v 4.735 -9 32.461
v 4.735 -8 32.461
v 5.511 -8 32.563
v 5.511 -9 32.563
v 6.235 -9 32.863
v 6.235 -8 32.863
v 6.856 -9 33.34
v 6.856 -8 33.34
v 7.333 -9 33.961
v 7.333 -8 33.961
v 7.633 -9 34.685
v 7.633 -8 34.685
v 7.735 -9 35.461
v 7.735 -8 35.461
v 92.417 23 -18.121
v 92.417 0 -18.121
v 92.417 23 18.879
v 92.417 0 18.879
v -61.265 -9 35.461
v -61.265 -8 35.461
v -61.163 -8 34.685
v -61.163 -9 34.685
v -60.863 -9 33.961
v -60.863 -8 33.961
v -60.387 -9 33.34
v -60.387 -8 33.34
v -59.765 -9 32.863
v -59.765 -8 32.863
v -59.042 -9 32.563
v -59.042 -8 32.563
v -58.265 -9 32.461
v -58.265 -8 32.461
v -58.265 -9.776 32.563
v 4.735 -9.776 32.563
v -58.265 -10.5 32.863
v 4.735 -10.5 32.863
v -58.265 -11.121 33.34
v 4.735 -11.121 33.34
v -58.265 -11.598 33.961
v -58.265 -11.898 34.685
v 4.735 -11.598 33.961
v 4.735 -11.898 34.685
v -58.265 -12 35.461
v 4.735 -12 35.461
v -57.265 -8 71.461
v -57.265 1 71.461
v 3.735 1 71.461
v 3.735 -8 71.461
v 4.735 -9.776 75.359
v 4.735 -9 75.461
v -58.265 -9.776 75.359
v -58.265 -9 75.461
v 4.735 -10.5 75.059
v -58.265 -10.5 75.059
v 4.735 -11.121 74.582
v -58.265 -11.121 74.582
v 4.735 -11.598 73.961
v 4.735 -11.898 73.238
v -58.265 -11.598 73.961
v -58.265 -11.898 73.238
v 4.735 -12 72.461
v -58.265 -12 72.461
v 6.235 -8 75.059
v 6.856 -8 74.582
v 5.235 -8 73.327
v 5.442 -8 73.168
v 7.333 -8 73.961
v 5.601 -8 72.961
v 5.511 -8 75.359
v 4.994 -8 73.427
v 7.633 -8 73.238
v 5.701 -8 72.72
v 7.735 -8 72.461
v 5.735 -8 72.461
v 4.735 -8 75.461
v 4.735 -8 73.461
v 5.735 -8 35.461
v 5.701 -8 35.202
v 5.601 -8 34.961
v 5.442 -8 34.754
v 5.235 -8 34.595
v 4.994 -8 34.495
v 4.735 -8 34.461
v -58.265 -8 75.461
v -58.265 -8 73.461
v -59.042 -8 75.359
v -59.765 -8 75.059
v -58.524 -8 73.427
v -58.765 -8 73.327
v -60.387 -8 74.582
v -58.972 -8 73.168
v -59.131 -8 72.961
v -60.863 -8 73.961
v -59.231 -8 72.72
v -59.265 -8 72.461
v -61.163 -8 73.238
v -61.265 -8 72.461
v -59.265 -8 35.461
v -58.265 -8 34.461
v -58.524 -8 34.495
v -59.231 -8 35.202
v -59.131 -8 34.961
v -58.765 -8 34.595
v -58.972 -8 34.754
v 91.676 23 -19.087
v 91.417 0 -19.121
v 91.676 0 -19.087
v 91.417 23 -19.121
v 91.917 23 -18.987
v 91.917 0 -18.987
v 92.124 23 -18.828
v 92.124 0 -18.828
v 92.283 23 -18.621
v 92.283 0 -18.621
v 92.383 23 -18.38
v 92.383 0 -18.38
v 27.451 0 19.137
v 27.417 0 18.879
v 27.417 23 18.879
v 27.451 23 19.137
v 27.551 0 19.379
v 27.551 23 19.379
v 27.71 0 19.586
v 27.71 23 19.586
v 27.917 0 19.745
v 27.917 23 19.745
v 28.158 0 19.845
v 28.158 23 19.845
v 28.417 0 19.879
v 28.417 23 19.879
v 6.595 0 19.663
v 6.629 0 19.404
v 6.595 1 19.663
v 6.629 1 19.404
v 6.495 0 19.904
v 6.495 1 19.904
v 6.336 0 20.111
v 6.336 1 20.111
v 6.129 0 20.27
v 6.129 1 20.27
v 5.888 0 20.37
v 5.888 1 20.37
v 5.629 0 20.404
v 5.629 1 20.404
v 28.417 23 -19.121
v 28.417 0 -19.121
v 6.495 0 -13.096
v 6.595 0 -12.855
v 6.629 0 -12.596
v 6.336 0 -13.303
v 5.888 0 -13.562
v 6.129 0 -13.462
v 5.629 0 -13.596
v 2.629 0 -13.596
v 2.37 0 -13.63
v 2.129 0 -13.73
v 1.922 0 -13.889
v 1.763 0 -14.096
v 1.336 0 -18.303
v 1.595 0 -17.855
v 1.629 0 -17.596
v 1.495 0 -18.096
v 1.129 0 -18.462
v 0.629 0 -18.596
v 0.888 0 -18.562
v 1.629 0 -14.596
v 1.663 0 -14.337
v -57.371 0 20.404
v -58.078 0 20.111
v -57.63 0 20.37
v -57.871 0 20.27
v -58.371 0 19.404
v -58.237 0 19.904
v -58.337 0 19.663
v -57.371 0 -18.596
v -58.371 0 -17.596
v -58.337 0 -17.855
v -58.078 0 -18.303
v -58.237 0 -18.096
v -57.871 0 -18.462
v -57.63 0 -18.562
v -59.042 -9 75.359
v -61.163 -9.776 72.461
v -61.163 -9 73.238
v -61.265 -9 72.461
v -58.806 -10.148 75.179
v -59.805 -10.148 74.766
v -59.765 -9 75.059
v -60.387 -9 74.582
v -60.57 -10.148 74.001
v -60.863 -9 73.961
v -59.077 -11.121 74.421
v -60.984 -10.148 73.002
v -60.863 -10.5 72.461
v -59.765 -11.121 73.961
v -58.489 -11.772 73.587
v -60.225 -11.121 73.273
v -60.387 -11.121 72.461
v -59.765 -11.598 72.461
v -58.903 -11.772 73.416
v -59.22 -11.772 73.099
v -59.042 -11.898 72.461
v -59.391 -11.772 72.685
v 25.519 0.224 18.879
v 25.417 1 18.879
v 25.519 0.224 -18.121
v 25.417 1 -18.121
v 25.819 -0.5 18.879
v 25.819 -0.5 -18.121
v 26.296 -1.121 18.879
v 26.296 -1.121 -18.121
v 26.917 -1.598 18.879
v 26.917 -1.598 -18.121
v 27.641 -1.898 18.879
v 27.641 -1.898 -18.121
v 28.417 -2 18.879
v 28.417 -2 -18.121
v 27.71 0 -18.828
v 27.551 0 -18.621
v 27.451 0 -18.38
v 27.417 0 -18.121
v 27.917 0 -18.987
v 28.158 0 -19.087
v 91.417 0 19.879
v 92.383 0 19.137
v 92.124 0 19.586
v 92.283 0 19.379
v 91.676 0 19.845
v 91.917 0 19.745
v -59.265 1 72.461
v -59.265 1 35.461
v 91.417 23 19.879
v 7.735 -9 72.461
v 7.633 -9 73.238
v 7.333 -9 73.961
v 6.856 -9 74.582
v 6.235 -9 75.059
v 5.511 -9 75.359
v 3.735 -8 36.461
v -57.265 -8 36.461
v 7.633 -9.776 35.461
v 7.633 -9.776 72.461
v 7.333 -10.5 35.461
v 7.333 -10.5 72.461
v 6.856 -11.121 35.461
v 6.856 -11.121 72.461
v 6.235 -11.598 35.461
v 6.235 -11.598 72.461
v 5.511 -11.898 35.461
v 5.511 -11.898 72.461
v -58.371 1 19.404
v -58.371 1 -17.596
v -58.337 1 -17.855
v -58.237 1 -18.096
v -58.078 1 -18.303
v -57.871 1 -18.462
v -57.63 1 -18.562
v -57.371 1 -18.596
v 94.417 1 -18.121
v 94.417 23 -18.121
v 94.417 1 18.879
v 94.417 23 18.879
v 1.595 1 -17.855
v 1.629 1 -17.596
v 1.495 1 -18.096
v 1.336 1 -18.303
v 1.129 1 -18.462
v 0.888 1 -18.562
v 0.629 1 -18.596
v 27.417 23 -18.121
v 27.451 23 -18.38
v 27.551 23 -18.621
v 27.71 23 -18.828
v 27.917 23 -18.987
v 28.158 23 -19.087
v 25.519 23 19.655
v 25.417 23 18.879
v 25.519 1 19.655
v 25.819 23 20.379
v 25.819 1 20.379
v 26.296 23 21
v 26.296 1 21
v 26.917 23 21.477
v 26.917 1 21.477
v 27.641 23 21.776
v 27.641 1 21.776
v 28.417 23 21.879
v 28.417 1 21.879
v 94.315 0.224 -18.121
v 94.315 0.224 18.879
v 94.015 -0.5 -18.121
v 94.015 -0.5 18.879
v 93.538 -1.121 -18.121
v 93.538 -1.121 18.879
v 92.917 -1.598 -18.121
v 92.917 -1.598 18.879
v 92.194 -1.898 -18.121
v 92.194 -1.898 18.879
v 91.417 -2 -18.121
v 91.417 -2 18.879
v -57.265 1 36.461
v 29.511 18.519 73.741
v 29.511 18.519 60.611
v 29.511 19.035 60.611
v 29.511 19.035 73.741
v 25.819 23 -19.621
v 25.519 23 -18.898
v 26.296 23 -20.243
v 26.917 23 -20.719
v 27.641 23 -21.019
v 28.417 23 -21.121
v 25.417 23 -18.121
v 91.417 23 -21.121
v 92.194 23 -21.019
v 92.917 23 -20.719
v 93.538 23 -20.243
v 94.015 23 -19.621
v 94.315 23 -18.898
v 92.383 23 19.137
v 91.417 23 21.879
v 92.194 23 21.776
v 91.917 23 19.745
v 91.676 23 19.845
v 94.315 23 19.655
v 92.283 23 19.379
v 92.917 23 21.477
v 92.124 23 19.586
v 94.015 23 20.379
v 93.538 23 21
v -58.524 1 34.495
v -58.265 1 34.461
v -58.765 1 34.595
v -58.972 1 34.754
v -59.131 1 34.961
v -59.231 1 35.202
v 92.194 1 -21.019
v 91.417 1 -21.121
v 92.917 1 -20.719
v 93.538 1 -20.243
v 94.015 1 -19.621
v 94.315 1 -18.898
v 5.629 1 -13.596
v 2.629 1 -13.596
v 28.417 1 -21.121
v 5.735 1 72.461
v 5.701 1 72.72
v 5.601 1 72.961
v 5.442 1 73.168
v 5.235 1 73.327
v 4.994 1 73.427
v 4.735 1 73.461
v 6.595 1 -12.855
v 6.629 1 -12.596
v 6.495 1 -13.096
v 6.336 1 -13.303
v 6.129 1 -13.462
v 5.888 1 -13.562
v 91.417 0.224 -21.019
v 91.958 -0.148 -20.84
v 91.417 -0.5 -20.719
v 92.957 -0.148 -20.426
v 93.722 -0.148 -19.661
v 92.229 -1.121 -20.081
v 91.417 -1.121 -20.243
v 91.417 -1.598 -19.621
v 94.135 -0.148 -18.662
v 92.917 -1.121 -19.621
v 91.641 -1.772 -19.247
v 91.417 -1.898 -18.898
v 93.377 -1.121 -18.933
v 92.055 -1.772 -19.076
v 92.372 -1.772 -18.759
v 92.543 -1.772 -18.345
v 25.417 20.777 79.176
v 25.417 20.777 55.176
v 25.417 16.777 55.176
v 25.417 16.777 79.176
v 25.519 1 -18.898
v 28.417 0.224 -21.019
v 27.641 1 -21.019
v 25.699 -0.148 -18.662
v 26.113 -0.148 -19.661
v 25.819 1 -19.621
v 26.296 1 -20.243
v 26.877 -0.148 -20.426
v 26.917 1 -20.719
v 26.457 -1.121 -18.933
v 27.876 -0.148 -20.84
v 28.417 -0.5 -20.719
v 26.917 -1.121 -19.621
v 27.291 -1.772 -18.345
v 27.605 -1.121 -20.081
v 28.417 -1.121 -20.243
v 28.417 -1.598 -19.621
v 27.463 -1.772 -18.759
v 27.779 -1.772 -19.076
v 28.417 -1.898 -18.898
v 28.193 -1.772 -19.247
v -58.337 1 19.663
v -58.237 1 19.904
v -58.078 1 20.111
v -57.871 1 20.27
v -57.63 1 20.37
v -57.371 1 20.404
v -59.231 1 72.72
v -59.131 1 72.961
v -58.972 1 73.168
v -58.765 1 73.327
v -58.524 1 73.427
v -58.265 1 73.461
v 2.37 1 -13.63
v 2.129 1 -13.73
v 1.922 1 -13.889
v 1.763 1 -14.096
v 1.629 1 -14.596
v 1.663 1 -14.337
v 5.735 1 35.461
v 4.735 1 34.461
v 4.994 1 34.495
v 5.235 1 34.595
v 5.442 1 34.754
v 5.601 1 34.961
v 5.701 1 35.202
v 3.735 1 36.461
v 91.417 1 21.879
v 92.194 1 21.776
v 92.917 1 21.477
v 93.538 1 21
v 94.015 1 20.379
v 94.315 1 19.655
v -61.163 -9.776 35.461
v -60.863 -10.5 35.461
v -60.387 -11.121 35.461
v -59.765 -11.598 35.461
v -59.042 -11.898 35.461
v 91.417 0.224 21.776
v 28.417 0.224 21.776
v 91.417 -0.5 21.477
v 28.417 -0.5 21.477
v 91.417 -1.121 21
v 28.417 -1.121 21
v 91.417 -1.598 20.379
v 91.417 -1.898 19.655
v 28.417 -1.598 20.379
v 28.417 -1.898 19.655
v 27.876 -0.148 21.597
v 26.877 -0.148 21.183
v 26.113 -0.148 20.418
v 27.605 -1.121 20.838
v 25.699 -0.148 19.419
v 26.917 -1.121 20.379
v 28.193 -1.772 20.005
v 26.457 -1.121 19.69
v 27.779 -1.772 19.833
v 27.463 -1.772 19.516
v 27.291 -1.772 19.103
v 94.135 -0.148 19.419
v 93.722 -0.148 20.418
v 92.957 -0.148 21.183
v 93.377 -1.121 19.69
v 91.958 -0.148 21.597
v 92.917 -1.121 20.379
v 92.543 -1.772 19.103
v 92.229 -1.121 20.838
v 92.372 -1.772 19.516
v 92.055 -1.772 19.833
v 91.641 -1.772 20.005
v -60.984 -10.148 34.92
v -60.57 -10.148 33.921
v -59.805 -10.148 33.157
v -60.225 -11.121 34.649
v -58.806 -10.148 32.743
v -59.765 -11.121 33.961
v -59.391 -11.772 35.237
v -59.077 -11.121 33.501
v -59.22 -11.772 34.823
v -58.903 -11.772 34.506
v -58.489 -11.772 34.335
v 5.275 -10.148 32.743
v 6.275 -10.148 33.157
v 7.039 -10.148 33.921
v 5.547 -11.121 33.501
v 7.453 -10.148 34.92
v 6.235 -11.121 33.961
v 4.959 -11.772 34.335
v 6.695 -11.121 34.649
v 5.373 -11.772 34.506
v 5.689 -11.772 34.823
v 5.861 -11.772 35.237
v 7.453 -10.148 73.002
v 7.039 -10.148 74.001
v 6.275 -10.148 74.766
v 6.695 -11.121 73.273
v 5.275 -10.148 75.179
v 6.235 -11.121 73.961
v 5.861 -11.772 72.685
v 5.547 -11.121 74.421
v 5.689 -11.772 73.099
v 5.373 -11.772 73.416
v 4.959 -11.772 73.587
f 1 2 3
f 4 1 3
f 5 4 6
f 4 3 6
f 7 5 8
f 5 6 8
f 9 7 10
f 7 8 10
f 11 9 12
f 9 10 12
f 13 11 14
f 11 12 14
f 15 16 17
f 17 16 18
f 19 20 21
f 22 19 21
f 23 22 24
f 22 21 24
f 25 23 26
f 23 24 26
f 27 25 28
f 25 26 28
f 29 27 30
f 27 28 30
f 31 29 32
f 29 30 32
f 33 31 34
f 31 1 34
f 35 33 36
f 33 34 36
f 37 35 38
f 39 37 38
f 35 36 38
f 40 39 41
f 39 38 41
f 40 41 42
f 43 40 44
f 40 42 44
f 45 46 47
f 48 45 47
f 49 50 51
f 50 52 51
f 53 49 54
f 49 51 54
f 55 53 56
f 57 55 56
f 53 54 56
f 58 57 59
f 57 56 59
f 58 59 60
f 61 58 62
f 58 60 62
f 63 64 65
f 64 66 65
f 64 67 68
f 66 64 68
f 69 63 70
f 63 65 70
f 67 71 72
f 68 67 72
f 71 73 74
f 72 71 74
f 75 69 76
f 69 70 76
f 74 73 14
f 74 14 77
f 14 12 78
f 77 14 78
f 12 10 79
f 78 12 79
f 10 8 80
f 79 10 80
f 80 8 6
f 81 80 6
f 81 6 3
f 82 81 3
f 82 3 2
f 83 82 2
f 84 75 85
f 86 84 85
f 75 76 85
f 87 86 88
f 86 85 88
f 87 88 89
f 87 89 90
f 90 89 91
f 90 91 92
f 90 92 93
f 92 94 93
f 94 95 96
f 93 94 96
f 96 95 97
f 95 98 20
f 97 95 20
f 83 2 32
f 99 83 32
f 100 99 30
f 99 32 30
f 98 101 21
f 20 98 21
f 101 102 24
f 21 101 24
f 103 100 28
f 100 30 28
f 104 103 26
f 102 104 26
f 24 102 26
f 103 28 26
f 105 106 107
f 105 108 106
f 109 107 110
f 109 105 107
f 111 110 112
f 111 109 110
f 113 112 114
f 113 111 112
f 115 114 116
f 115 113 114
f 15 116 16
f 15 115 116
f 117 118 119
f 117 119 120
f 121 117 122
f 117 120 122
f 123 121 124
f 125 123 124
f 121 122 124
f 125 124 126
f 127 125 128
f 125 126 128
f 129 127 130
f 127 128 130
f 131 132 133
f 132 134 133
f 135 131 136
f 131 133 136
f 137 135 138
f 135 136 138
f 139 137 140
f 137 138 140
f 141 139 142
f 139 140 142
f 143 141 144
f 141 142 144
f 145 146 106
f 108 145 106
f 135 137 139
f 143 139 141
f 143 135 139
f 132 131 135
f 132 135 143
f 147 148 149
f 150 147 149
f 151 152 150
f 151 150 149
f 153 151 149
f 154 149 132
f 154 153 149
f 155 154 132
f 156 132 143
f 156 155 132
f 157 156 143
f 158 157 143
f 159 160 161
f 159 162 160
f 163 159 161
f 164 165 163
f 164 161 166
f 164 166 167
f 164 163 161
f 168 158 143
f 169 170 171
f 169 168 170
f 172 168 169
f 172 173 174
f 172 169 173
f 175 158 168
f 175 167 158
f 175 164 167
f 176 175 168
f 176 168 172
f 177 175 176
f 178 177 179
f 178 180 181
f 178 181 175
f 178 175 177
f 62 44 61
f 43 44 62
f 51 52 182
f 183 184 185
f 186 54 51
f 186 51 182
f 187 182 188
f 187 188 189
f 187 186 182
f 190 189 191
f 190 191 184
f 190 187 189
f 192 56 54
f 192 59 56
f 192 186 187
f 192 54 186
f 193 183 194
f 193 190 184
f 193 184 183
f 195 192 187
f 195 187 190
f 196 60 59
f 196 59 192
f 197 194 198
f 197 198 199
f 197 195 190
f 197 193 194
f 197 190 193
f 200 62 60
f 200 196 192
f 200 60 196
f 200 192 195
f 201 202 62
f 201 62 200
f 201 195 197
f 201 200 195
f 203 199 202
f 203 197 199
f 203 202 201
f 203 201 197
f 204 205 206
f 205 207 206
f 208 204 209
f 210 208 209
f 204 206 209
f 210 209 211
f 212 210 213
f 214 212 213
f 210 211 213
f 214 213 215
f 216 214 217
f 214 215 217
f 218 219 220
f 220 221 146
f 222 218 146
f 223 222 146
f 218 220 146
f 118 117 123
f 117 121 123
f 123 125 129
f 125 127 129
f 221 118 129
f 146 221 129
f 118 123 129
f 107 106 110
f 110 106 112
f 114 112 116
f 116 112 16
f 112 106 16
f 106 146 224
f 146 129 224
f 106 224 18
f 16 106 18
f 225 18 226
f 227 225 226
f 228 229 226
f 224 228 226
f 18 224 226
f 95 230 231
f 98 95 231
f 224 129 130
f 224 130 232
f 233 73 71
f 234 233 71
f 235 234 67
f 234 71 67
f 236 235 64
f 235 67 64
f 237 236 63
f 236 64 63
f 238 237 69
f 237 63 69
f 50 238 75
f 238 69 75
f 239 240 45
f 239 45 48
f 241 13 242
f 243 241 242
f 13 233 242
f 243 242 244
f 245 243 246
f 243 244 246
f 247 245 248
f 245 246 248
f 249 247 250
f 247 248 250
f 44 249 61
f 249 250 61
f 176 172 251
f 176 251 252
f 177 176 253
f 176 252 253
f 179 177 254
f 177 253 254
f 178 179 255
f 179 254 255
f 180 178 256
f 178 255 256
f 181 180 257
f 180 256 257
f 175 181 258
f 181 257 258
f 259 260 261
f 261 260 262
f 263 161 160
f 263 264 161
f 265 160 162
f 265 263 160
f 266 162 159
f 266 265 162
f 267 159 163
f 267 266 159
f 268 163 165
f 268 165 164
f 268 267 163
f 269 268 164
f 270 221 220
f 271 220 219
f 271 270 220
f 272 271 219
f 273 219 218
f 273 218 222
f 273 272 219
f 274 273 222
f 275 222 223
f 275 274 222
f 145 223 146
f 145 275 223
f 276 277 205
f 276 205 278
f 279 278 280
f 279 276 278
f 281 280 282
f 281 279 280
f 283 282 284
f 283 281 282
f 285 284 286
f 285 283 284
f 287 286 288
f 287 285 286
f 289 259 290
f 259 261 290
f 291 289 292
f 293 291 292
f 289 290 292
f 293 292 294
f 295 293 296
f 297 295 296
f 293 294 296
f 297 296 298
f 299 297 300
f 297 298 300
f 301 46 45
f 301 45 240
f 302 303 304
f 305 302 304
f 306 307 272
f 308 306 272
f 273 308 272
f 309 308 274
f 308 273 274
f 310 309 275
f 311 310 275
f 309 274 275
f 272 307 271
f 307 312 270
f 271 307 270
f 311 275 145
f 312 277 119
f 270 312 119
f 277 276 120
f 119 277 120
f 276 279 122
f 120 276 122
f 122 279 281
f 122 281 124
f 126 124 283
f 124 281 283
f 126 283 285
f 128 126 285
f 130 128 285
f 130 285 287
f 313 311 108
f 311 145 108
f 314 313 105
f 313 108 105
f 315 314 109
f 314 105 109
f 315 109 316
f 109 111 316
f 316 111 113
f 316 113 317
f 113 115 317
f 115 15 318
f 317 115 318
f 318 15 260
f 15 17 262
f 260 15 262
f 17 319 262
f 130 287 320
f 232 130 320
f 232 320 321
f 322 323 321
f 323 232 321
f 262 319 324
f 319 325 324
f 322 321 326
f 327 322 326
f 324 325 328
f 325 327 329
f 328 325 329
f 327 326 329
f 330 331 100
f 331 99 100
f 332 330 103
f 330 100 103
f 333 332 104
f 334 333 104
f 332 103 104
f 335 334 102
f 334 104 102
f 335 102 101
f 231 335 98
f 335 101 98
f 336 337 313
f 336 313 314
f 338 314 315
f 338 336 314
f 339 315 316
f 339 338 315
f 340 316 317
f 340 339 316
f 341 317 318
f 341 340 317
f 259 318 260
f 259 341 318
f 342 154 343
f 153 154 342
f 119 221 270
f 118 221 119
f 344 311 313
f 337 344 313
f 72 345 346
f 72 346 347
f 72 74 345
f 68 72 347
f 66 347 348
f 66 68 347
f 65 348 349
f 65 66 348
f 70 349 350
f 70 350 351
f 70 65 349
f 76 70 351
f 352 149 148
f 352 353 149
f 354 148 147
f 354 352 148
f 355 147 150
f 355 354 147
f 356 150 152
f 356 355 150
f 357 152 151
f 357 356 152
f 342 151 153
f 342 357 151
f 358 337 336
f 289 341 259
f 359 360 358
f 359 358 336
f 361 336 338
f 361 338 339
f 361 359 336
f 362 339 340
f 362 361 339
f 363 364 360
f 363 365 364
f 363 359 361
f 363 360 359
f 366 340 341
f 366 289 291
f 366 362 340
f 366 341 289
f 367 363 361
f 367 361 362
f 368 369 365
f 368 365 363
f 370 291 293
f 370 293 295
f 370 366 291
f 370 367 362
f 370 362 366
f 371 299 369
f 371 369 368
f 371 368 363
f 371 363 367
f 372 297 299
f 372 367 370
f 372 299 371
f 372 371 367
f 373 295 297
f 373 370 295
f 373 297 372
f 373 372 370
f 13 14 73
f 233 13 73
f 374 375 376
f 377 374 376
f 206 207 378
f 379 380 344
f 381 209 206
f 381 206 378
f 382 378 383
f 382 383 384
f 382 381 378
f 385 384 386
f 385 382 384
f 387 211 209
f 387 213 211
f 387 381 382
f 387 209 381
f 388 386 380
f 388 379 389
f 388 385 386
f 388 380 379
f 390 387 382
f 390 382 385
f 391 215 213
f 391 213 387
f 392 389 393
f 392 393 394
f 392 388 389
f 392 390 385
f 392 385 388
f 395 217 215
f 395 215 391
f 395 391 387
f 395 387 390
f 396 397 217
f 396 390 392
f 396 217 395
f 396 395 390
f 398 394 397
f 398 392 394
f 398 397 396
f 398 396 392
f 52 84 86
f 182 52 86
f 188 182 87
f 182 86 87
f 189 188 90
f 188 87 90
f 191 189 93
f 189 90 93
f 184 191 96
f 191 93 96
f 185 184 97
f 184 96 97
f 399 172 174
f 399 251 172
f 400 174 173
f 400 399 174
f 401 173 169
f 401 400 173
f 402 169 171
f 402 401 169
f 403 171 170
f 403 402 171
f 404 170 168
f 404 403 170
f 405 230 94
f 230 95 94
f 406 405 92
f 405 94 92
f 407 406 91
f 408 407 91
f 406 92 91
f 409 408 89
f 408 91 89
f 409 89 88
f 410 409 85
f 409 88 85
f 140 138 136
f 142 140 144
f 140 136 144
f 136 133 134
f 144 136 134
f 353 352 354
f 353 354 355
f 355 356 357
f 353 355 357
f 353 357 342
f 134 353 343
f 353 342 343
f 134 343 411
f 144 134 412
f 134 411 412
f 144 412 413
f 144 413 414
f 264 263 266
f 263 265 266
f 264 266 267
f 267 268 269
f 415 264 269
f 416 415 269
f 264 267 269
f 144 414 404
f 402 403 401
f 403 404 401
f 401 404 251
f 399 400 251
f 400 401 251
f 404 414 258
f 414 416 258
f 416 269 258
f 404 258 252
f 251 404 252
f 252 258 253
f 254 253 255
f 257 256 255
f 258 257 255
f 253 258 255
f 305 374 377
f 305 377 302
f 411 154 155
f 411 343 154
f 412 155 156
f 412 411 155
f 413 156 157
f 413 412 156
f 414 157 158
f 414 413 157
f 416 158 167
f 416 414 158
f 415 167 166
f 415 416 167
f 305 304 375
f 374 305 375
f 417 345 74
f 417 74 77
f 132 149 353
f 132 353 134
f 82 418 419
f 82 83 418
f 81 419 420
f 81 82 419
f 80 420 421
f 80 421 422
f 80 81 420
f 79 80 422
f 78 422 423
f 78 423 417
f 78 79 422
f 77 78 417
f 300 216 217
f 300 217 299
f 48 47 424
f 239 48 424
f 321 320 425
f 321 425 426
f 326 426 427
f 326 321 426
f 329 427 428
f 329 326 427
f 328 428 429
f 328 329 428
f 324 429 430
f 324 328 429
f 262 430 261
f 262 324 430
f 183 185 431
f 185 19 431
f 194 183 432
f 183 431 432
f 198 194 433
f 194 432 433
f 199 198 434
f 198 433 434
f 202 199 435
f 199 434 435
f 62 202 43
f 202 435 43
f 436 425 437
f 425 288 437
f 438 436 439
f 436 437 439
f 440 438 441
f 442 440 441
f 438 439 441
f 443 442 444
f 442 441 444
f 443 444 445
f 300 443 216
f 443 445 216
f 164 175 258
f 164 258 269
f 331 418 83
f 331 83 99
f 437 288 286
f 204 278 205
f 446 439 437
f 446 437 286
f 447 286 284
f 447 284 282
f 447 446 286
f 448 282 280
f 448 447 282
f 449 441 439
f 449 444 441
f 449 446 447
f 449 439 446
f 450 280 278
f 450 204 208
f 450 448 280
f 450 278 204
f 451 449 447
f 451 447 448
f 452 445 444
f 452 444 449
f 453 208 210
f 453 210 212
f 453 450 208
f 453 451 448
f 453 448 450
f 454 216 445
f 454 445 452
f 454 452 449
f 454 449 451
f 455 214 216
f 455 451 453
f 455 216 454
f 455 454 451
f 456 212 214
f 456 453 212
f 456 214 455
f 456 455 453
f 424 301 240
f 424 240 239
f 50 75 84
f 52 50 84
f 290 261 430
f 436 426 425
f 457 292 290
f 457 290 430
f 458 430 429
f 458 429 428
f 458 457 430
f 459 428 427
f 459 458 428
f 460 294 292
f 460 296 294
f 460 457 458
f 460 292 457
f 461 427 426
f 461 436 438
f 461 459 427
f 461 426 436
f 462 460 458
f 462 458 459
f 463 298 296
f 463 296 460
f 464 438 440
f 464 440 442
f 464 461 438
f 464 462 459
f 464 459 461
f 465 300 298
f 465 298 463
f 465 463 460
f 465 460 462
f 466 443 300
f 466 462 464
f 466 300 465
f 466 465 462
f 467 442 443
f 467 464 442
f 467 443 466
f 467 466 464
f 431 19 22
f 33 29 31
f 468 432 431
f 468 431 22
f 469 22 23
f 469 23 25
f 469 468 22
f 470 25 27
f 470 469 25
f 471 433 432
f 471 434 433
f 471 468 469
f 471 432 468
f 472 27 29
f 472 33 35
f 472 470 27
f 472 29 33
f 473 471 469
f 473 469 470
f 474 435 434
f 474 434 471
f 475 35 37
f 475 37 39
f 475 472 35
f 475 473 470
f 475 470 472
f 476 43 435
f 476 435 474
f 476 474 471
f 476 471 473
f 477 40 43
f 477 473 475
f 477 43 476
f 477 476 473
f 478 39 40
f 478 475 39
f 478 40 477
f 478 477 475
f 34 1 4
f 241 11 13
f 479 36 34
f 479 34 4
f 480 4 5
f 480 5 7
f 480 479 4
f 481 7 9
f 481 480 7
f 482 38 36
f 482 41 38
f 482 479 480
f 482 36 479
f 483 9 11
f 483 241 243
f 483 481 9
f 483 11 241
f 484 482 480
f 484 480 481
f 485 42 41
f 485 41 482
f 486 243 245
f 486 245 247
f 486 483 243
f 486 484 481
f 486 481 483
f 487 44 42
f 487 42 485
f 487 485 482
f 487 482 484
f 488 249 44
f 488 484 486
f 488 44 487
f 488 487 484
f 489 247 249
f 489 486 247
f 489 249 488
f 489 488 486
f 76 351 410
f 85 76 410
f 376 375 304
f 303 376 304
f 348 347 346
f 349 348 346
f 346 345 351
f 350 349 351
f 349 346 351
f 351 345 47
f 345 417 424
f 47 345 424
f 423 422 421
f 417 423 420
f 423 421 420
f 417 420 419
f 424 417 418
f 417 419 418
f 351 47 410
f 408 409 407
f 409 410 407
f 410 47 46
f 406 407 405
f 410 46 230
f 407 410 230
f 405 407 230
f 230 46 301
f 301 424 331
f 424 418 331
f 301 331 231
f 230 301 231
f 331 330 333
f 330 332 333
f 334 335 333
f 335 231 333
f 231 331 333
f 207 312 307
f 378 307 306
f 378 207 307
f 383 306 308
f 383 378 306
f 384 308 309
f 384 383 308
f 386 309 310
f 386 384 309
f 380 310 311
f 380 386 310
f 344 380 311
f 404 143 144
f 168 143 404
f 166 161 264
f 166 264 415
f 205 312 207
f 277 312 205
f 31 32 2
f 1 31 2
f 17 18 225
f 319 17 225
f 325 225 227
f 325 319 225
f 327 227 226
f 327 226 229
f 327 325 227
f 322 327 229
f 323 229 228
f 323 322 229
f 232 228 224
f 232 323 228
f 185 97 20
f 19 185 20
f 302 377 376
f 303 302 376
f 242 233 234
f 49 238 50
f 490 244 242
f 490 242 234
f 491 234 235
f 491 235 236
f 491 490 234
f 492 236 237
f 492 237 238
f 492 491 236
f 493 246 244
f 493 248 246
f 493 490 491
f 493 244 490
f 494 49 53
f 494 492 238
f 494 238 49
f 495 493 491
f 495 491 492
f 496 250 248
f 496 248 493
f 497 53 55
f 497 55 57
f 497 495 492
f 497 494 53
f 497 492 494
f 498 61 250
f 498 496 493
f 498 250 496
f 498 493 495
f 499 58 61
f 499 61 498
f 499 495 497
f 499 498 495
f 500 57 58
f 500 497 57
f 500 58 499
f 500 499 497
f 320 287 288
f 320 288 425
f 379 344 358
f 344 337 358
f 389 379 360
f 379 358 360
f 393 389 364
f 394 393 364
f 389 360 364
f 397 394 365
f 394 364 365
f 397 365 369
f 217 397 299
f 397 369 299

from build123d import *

# Parameters (mm, degrees)
BOSS_EXTRUDE1_DEPTH   = 1
FILLET2_R             = 1
FILLET3_R             = 1
FILLET4_R             = 1
FILLET5_R             = 1
SKETCH3_W             = 69
SKETCH3_H             = 43
SKETCH3_W_2           = 65
SKETCH3_H_2           = 39
BOSS_EXTRUDE2_DEPTH   = 23
SKETCH5_W             = 69
SKETCH5_H             = 43
BOSS_EXTRUDE3_DEPTH   = 2
FILLET6_R             = 1
FILLET7_R             = 1
FILLET8_R             = 1
FILLET9_R             = 1
FILLET10_R            = 3
FILLET11_R            = 3
BOSS_EXTRUDE5_DEPTH   = 9
FILLET12_R            = 1
FILLET13_R            = 1
BOSS_EXTRUDE6_DEPTH   = 4
SKETCH9_W             = 61
SKETCH9_H             = 35
BOSS_EXTRUDE7_DEPTH   = 9
FILLET14_R            = 3
FILLET15_R            = 3
BOSS_EXTRUDE8_DEPTH   = 24
BOSS_EXTRUDE9_DEPTH   = 4
BOSS_EXTRUDE9_2_DEPTH = 4


with BuildPart() as part:
    # Sketch1 → Boss-Extrude1 (new body)
    with BuildSketch(Plane(origin=(0, 0, 0), x_dir=(1, 0, 0), z_dir=(0, 1, 0))):
        Polygon((-58.370860927, -20.40397351), (-58.370860927, 18.59602649), (1.629139073, 18.59602649), (1.629139073, 13.59602649), (6.629139073, 13.59602649), (6.629139073, -20.40397351), align=None)
    extrude(amount=BOSS_EXTRUDE1_DEPTH)

    # Fillet2
    fillet2_edges = [part.edges().sort_by_distance(p)[0] for p in [
        (6.629139073, 0.5, 20.40397351),
    ]]
    fillet(fillet2_edges, radius=FILLET2_R)

    # Fillet3
    fillet3_edges = [part.edges().sort_by_distance(p)[0] for p in [
        (1.629139073, 0.5, -18.59602649),
        (1.629139073, 0.5, -13.59602649),
        (6.629139073, 0.5, -13.59602649),
    ]]
    fillet(fillet3_edges, radius=FILLET3_R)

    # Fillet4
    fillet4_edges = [part.edges().sort_by_distance(p)[0] for p in [
        (-58.370860927, 0.5, -18.59602649),
    ]]
    fillet(fillet4_edges, radius=FILLET4_R)

    # Fillet5
    fillet5_edges = [part.edges().sort_by_distance(p)[0] for p in [
        (-58.370860927, 0.5, 20.40397351),
    ]]
    fillet(fillet5_edges, radius=FILLET5_R)


with BuildPart() as body_2:
    # Sketch3 → Boss-Extrude2 (new body)
    with BuildSketch(Plane.XZ):
        with Locations((59.917093339, 0.378619439)):
            Rectangle(SKETCH3_W, SKETCH3_H)
        with Locations((59.917093339, 0.378619439)):
            Rectangle(SKETCH3_W_2, SKETCH3_H_2, mode=Mode.SUBTRACT)
    extrude(amount=-BOSS_EXTRUDE2_DEPTH)

    # Sketch5 → Boss-Extrude3 (add)
    with BuildSketch(Plane.XZ):
        with Locations((59.917093339, 0.378619439)):
            Rectangle(SKETCH5_W, SKETCH5_H)
    extrude(amount=BOSS_EXTRUDE3_DEPTH)

    # Fillet6
    fillet6_edges = [body_2.edges().sort_by_distance(p)[0] for p in [
        (27.417093339, 11.5, 19.878619439),
    ]]
    fillet(fillet6_edges, radius=FILLET6_R)

    # Fillet7
    fillet7_edges = [body_2.edges().sort_by_distance(p)[0] for p in [
        (27.417093339, 11.5, -19.121380561),
    ]]
    fillet(fillet7_edges, radius=FILLET7_R)

    # Fillet8
    fillet8_edges = [body_2.edges().sort_by_distance(p)[0] for p in [
        (92.417093339, 11.5, -19.121380561),
    ]]
    fillet(fillet8_edges, radius=FILLET8_R)

    # Fillet9
    fillet9_edges = [body_2.edges().sort_by_distance(p)[0] for p in [
        (92.417093339, 11.5, 19.878619439),
    ]]
    fillet(fillet9_edges, radius=FILLET9_R)

    # Fillet10
    fillet10_edges = [body_2.edges().sort_by_distance(p)[0] for p in [
        (94.417093339, 10.5, -21.121380561),
        (25.417093339, 10.5, -21.121380561),
        (94.417093339, 10.5, 21.878619439),
    ]]
    fillet(fillet10_edges, radius=FILLET10_R)

    # Fillet11
    fillet11_edges = [body_2.edges().sort_by_distance(p)[0] for p in [
        (25.417093339, 10.5, 21.878619439),
    ]]
    fillet(fillet11_edges, radius=FILLET11_R)

    # Fillet14
    fillet14_edges = [body_2.edges().sort_by_distance(p)[0] for p in [
        (94.417093339, -2, 0.378619439),
        (59.917093339, -2, -21.121380561),
        (59.917093339, -2, 21.878619439),
        (93.538413683, -2, -20.242700905),
        (26.295772995, -2, -20.242700905),
        (93.538413683, -2, 20.999939782),
        (25.417093339, -2, 0.378619439),
        (26.295772995, -2, 20.999939782),
    ]]
    fillet(fillet14_edges, radius=FILLET14_R)


with BuildPart() as body_3:
    # Sketch7 → Boss-Extrude5 (new body)
    with BuildSketch(Plane(origin=(-22.905465396, 1, 42.53872145), x_dir=(1, 0, 0), z_dir=(0, 1, 0))):
        Polygon((-36.359783771, -30.922325969), (-36.359783771, 8.077674031), (23.640216229, 8.077674031), (28.640216229, 8.077674031), (28.640216229, 3.077674031), (28.640216229, -30.922325969), align=None)
    extrude(amount=-BOSS_EXTRUDE5_DEPTH)

    # Fillet12
    fillet12_edges = [body_3.edges().sort_by_distance(p)[0] for p in [
        (5.734750833, -3.5, 34.461047419),
        (5.734750833, -3.5, 73.461047419),
    ]]
    fillet(fillet12_edges, radius=FILLET12_R)

    # Fillet13
    fillet13_edges = [body_3.edges().sort_by_distance(p)[0] for p in [
        (-59.265249167, -3.5, 73.461047419),
        (-59.265249167, -3.5, 34.461047419),
    ]]
    fillet(fillet13_edges, radius=FILLET13_R)

    # Sketch8 → Boss-Extrude6 (add)
    with BuildSketch(Plane(origin=(0, -8, 0), x_dir=(-1, 0, 0), z_dir=(0, -1, 0))):
        with BuildLine():
            Line((58.265249167, -32.461047419), (-4.734750833, -32.461047419))
            ThreePointArc((-4.734750833, -32.461047419), (-6.856071177, -33.339727075), (-7.734750833, -35.461047419))
            Line((-7.734750833, -35.461047419), (-7.734750833, -72.461047419))
            ThreePointArc((-7.734750833, -72.461047419), (-6.856071177, -74.582367762), (-4.734750833, -75.461047419))
            Line((-4.734750833, -75.461047419), (58.265249167, -75.461047419))
            ThreePointArc((58.265249167, -75.461047419), (60.38656951, -74.582367762), (61.265249167, -72.461047419))
            Line((61.265249167, -72.461047419), (61.265249167, -35.461047419))
            ThreePointArc((61.265249167, -35.461047419), (60.38656951, -33.339727075), (58.265249167, -32.461047419))
        make_face()
    extrude(amount=BOSS_EXTRUDE6_DEPTH)


with BuildPart() as body_4:
    # Sketch9 → Boss-Extrude7 (new body)
    with BuildSketch(Plane(origin=(0, 1, 0), x_dir=(1, 0, 0), z_dir=(0, 1, 0))):
        with Locations((-26.765249167, -53.961047419)):
            Rectangle(SKETCH9_W, SKETCH9_H)
    extrude(amount=-BOSS_EXTRUDE7_DEPTH)


with BuildPart() as body_3_1:
    add(body_3.part)

    # Combine1: cut body 4
    add(body_4.part, mode=Mode.SUBTRACT)

    # Fillet15
    fillet15_edges = [body_3_1.edges().sort_by_distance(p)[0] for p in [
        (-60.38656951, -12, 33.339727075),
        (-26.765249167, -12, 32.461047419),
        (6.856071177, -12, 33.339727075),
        (7.734750833, -12, 53.961047419),
        (6.856071177, -12, 74.582367762),
        (-26.765249167, -12, 75.461047419),
        (-60.38656951, -12, 74.582367762),
        (-61.265249167, -12, 53.961047419),
    ]]
    fillet(fillet15_edges, radius=FILLET15_R)


with BuildPart() as body_4_2:
    # Sketch12 → Boss-Extrude8 (new body)
    with BuildSketch(Plane.XY.offset(55.17585305)):
        Polygon((25.417093339, 20.776561778), (25.417093339, 16.776561778), (29.511035961, 18.518502263), (29.511035961, 19.034621293), align=None)
    extrude(amount=BOSS_EXTRUDE8_DEPTH)


with BuildPart() as body_5:
    # Sketch15 → Boss-Extrude9 (new body)
    with BuildSketch(Plane(origin=(0, 20.776561778, 0), x_dir=(1, 0, 0), z_dir=(0, 1, 0))):
        Polygon((25.417093339, -79.17585305), (29.511035961, -73.74092263), (29.511035961, -79.17585305), align=None)
    extrude(amount=-BOSS_EXTRUDE9_DEPTH)


with BuildPart() as body_6:
    # Sketch15 → Boss-Extrude9 2 (new body)
    with BuildSketch(Plane(origin=(0, 20.776561778, 0), x_dir=(1, 0, 0), z_dir=(0, 1, 0))):
        Polygon((29.511035961, -60.610783469), (29.511035961, -55.17585305), (25.417093339, -55.17585305), align=None)
    extrude(amount=-BOSS_EXTRUDE9_2_DEPTH)


with BuildPart() as body_4_2_1:
    add(body_4_2.part)

    # Combine2: cut body 5, body 6
    add(body_5.part, mode=Mode.SUBTRACT)
    add(body_6.part, mode=Mode.SUBTRACT)


solid = Compound([part.part, body_2.part, body_3_1.part, body_4_2_1.part])
